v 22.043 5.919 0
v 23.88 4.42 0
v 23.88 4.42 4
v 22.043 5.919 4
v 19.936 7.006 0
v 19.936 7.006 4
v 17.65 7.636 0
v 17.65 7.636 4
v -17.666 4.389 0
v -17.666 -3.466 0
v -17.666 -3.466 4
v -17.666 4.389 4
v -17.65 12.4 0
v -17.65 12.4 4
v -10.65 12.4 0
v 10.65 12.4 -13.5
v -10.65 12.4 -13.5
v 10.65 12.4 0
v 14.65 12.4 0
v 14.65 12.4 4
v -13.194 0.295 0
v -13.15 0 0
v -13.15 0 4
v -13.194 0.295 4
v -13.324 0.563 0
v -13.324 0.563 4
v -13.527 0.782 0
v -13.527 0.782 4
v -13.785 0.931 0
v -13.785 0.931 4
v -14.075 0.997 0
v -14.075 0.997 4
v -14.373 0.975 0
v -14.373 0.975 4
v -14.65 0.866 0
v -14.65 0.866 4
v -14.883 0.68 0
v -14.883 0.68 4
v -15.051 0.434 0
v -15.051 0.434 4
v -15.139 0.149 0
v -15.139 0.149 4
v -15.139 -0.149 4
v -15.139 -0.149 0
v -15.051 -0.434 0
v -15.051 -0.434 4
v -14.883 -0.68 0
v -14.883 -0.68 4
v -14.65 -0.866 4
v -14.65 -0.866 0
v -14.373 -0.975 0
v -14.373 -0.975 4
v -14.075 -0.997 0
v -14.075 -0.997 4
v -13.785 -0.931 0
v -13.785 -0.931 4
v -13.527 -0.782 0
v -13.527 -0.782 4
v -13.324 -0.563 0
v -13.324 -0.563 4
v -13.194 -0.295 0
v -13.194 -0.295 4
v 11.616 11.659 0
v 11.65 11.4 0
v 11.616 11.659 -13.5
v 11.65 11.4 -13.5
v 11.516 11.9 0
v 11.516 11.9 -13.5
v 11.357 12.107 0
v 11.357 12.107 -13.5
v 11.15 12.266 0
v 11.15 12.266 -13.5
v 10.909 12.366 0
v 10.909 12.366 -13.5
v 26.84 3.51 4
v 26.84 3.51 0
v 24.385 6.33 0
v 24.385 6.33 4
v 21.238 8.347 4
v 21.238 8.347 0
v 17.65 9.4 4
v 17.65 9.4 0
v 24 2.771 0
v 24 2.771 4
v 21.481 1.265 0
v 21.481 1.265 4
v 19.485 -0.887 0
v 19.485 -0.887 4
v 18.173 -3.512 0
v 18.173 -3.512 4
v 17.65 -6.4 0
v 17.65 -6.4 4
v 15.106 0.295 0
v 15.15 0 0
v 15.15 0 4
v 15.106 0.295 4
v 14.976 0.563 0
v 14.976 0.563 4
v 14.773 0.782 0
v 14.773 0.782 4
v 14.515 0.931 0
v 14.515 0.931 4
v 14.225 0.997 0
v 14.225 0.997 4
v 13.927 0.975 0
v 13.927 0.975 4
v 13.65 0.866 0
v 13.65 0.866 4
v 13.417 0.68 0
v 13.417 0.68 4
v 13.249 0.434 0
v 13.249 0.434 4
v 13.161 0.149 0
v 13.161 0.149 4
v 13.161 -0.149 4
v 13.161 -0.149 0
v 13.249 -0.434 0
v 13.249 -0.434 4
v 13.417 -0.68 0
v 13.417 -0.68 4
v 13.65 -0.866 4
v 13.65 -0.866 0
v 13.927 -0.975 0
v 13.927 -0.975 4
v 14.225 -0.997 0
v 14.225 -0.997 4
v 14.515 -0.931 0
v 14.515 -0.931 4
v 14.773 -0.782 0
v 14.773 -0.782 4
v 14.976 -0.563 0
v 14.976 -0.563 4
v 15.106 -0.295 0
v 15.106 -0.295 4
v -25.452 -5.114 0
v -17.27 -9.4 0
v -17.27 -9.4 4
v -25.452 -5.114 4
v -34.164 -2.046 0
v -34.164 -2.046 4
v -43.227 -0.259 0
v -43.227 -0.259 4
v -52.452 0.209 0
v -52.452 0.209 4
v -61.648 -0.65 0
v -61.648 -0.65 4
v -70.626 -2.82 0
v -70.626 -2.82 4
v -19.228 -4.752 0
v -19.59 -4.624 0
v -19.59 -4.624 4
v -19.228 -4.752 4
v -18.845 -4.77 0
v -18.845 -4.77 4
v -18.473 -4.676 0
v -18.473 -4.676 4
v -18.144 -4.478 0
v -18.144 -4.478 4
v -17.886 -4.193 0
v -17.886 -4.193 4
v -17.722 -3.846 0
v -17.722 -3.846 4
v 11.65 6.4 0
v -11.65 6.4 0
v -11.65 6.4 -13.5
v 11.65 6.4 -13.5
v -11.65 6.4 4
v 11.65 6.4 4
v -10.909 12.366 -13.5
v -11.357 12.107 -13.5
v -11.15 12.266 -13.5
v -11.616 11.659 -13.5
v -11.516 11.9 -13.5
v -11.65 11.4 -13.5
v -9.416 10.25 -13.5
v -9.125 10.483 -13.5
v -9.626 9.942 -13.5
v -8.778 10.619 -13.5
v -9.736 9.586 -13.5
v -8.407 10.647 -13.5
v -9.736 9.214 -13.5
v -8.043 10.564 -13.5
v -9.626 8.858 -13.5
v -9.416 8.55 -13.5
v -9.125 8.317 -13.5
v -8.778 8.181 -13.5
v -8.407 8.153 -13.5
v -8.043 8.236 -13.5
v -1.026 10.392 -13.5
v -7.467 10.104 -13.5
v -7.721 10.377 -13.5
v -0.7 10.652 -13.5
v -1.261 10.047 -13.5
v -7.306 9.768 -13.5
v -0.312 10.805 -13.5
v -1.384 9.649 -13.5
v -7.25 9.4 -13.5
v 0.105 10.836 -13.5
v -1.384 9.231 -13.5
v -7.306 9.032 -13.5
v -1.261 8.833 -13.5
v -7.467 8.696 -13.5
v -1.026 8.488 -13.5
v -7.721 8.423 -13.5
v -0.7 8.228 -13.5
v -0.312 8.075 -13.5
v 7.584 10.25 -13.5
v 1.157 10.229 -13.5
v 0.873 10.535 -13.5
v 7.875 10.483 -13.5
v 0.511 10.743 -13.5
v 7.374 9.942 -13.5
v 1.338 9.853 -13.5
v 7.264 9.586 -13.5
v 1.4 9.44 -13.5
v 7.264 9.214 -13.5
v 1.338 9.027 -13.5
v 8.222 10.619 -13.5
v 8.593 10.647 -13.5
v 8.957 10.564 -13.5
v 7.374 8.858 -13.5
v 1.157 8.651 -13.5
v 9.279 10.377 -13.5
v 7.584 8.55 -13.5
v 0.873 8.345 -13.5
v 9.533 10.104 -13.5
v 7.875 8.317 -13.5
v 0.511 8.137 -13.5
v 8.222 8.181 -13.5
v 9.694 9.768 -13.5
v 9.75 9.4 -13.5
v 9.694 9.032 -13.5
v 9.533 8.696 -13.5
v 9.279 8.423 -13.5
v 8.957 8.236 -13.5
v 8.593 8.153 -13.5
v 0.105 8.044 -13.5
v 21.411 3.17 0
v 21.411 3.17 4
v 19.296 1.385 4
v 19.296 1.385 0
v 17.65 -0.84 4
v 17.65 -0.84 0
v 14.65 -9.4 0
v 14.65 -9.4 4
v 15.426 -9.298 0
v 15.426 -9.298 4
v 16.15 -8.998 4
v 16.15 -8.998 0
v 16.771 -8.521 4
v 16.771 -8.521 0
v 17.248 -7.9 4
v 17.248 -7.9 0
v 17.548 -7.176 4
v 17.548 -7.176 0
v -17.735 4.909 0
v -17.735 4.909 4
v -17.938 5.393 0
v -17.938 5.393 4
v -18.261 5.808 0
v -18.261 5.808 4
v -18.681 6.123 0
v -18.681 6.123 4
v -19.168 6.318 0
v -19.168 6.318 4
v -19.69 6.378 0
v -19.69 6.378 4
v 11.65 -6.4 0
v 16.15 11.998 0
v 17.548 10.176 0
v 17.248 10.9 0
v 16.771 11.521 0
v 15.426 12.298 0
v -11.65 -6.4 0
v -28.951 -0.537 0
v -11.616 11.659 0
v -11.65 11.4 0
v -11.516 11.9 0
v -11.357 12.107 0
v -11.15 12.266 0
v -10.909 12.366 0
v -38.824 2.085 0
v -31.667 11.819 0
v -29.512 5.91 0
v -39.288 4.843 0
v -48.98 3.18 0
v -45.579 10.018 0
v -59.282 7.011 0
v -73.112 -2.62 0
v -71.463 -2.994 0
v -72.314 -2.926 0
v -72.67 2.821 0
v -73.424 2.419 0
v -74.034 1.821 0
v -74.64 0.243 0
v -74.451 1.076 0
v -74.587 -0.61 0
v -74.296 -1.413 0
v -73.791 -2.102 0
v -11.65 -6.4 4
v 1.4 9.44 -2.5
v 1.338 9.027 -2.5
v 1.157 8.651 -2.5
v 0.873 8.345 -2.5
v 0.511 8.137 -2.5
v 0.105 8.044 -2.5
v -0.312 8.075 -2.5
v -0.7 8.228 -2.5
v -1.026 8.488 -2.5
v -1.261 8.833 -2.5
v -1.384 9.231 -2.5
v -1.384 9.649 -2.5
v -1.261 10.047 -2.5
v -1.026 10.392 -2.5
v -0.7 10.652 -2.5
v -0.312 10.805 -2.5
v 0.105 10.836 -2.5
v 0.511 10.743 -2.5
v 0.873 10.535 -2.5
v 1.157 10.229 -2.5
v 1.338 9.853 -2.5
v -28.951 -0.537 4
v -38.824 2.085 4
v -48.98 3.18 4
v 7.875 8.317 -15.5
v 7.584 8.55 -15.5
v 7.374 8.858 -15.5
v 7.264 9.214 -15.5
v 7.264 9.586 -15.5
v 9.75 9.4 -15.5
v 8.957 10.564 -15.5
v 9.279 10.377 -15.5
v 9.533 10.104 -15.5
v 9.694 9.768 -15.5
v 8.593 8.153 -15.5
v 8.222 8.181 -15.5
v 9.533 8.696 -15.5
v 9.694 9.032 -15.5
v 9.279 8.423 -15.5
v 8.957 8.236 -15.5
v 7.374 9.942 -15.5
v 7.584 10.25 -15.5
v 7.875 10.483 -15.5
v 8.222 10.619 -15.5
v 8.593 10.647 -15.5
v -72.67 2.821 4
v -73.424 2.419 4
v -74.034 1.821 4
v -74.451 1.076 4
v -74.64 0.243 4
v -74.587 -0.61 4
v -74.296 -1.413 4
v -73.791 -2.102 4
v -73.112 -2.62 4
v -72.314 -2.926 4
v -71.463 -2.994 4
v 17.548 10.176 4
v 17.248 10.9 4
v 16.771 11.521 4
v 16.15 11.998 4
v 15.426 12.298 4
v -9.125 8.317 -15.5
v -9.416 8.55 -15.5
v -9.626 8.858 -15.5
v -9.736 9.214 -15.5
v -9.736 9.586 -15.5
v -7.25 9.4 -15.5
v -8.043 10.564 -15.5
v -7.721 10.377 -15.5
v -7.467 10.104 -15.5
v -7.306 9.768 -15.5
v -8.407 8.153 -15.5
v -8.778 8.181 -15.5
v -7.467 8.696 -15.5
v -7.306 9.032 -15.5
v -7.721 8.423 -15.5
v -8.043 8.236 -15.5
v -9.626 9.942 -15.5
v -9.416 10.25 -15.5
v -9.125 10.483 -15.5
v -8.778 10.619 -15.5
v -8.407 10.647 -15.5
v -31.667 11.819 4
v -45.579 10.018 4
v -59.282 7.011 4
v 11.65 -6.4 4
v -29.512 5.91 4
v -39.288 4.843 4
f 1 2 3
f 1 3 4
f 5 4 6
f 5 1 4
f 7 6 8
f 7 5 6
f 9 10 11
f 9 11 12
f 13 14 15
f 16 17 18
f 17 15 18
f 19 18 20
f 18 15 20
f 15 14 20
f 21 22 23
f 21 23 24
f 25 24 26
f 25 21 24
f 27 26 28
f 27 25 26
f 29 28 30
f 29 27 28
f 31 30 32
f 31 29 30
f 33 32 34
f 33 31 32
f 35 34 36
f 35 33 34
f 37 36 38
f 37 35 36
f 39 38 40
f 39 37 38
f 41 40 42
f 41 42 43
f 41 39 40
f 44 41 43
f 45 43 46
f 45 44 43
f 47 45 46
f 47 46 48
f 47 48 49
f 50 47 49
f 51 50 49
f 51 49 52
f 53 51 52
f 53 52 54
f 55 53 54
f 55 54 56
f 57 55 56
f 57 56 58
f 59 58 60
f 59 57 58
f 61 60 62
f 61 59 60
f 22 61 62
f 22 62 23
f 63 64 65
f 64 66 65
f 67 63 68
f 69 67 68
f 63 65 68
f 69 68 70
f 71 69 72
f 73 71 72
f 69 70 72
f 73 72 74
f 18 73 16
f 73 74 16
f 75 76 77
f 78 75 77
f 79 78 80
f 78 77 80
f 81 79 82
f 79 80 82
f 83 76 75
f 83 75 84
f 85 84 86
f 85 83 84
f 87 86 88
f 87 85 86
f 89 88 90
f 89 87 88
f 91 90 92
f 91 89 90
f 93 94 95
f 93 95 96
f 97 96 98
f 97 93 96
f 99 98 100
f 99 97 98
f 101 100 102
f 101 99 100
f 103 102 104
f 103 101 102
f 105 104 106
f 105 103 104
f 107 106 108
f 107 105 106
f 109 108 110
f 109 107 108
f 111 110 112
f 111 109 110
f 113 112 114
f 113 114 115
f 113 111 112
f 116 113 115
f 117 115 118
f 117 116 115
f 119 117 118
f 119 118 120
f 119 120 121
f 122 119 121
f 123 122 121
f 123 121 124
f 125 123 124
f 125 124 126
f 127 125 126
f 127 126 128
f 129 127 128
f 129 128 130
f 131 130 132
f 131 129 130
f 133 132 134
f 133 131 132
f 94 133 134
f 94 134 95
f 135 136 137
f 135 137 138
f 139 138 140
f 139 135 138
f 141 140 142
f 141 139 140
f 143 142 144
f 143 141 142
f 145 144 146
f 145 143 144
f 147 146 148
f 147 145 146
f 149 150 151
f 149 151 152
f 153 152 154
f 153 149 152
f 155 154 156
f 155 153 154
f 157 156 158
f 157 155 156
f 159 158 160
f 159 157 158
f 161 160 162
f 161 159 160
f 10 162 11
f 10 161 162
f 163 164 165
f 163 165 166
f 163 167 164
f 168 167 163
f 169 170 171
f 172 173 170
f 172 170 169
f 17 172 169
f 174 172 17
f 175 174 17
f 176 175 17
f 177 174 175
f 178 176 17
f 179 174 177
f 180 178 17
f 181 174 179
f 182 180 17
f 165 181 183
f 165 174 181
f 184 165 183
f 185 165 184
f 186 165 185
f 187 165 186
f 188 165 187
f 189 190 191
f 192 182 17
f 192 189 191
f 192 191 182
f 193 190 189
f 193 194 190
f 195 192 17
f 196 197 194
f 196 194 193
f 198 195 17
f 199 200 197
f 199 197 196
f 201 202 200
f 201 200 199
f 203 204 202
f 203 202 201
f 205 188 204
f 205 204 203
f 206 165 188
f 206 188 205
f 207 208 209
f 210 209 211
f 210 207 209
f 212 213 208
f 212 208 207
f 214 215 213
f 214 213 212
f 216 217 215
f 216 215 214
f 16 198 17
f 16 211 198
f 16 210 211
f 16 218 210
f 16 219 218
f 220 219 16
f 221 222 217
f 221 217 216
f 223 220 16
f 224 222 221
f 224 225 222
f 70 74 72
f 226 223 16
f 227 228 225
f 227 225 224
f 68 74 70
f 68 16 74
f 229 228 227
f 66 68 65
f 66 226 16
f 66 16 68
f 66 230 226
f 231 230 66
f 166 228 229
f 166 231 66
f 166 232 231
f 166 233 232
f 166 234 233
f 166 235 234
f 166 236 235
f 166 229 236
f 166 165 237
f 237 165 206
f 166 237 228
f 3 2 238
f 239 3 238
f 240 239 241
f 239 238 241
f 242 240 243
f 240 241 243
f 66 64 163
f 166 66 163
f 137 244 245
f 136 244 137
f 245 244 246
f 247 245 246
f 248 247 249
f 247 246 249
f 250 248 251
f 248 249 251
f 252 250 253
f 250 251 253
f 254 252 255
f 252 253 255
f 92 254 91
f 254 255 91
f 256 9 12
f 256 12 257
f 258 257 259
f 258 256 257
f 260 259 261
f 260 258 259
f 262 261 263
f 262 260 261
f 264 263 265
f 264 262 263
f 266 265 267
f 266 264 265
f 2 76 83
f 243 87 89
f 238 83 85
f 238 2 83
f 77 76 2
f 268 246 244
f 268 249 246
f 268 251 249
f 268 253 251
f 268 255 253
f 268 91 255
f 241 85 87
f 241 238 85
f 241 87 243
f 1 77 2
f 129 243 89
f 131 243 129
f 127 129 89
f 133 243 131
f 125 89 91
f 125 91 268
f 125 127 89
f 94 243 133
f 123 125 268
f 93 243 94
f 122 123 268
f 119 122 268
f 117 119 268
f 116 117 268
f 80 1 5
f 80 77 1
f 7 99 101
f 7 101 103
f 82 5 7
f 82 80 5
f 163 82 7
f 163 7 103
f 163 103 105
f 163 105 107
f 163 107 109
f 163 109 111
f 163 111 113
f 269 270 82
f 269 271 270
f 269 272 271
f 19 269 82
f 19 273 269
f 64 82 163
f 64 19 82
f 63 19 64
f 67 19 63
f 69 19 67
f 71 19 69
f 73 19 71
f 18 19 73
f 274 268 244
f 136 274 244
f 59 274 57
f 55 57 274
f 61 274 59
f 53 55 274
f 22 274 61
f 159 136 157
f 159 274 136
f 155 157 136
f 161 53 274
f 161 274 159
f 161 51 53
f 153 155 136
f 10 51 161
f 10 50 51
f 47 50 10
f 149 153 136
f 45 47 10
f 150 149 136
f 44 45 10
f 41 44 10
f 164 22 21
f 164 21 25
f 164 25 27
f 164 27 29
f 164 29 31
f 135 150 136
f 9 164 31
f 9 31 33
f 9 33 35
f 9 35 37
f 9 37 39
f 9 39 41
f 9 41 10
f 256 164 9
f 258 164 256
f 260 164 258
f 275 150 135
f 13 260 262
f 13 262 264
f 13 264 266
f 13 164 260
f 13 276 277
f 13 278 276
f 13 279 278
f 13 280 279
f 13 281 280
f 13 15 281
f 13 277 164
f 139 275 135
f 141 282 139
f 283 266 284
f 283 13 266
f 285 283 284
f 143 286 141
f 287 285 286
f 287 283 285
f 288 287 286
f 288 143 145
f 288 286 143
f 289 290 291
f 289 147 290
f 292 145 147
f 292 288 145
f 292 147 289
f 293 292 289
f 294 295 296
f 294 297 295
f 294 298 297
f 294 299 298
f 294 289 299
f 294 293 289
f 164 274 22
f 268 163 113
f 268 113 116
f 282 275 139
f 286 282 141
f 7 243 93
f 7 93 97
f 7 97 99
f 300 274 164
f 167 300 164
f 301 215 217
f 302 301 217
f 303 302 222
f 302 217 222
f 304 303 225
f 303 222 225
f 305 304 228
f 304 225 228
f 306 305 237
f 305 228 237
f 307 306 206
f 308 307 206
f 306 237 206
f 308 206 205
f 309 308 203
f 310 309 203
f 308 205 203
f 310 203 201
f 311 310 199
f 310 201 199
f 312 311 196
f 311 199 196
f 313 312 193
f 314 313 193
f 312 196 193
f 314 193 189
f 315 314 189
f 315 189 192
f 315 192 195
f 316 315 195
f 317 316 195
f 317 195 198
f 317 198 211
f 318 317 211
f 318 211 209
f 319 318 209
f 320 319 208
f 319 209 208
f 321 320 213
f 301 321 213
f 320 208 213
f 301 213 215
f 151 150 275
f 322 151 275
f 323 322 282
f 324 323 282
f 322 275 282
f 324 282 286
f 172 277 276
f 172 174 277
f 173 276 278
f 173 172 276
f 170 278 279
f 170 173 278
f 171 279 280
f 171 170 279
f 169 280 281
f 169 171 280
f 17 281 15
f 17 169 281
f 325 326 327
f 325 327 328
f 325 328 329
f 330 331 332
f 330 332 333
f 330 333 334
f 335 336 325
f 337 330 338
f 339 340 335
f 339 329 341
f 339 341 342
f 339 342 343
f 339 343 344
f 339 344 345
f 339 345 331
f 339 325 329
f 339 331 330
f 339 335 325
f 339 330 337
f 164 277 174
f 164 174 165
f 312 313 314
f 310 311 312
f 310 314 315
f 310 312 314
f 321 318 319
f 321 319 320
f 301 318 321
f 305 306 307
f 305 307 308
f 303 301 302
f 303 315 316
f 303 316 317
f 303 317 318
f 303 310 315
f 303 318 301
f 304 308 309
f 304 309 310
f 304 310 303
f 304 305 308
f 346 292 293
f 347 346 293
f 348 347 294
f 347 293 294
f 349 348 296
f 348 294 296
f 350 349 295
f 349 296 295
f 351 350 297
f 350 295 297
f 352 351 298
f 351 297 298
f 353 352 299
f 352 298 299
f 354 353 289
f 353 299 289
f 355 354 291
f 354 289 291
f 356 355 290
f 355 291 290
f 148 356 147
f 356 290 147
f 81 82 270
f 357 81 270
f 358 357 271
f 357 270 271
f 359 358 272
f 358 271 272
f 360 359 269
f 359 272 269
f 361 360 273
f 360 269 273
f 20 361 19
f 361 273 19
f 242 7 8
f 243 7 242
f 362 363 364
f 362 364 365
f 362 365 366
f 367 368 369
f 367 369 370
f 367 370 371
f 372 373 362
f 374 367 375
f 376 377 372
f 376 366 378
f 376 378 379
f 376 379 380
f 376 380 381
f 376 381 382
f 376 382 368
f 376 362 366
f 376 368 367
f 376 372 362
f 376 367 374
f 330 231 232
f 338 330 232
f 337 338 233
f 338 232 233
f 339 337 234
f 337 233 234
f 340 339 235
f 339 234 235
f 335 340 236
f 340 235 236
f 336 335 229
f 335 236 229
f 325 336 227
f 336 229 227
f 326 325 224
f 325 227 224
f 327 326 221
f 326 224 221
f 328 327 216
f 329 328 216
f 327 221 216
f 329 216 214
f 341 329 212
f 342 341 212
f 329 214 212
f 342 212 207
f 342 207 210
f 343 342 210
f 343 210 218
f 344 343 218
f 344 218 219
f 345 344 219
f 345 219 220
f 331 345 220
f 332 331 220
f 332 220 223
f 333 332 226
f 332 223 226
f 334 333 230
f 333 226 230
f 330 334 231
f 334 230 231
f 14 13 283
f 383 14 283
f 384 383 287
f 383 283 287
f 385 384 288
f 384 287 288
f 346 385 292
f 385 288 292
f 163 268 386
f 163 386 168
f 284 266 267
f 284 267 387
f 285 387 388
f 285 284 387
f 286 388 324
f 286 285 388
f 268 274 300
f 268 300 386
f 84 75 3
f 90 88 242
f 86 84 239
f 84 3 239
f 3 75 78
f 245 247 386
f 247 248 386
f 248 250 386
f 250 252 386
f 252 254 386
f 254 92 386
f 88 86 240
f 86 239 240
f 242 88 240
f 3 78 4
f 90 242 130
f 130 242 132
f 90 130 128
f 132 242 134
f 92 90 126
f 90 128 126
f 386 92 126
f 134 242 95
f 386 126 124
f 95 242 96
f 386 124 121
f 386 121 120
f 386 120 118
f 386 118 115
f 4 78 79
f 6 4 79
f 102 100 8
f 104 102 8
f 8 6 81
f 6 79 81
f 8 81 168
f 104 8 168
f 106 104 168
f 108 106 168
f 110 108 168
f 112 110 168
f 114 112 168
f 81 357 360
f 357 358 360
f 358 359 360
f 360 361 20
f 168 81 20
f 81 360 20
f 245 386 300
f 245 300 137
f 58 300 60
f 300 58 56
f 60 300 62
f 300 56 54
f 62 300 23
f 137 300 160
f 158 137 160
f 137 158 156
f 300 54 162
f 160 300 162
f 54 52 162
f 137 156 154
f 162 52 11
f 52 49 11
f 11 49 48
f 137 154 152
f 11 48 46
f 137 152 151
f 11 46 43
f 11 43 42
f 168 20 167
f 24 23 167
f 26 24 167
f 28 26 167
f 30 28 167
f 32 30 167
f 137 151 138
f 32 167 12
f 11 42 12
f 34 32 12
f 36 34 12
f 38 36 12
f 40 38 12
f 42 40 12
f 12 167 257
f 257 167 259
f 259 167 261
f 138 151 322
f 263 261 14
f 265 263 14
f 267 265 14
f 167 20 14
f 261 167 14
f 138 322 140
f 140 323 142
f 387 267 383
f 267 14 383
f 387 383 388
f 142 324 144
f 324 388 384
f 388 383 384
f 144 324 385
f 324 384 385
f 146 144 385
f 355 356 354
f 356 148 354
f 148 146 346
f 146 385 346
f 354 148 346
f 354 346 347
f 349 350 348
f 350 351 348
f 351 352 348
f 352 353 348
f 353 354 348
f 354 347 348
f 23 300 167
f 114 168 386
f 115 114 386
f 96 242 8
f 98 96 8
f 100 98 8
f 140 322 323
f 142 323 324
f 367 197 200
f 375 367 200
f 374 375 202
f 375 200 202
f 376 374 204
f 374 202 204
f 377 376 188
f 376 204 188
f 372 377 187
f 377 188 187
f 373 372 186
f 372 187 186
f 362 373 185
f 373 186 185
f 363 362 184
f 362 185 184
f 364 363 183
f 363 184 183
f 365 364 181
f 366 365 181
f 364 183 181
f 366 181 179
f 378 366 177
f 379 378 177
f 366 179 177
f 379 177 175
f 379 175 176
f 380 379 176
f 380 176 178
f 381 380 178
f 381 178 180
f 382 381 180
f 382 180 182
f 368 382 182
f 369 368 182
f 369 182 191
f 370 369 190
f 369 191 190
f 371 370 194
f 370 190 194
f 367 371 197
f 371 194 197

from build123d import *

# Parameters (mm, degrees)
SKETCH_R     = 1
SKETCH_W     = 23.3
SKETCH_H     = 12.8
PAD_DEPTH    = 4
SKETCH001_W  = 23.3
SKETCH001_H  = 6
PAD001_DEPTH = 13.5
SKETCH002_R  = 1.25
PAD002_DEPTH = 2
SKETCH003_R  = 1.4
POCKET_DEPTH = 11
FILLET_R     = 1
FILLET001_R  = 1


with BuildPart() as part:
    # Sketch → Pad (new body)
    with BuildSketch(Plane.XY):
        with BuildLine():
            Line((-17.65, 12.4), (14.65, 12.4))
            ThreePointArc((17.65, 9.4), (16.77132, 11.52132), (14.65, 12.4))
            ThreePointArc((26.84, 3.51), (22.883245, 7.450836), (17.65, 9.4))
            ThreePointArc((26.84, 3.51), (20.406481, 0.259943), (17.65, -6.4))
            ThreePointArc((14.65, -9.4), (16.77132, -8.52132), (17.65, -6.4))
            Line((14.65, -9.4), (-17.27, -9.4))
            ThreePointArc((-17.27, -9.4), (-43.226691, -0.259051), (-70.626477, -2.82))
            ThreePointArc((-72.67, 2.821276), (-74.470639, -1.021762), (-70.626477, -2.82))
            ThreePointArc((-17.65, 12.4), (-45.579054, 10.017677), (-72.67, 2.821276))
        make_face()
        with Locations((-14.15, 0)):
            Circle(SKETCH_R, mode=Mode.SUBTRACT)
        with Locations((14.15, 0)):
            Circle(SKETCH_R, mode=Mode.SUBTRACT)
        Rectangle(SKETCH_W, SKETCH_H, mode=Mode.SUBTRACT)
        with BuildLine():
            Line((17.65, 7.636176), (17.65, -0.84))
            ThreePointArc((23.88, 4.42), (20.301686, 2.338754), (17.65, -0.84))
            ThreePointArc((23.88, 4.42), (21.017458, 6.51712), (17.65, 7.636176))
        make_face(mode=Mode.SUBTRACT)
        with BuildLine():
            Line((-17.66615, -3.466269), (-17.66615, 4.388555))
            ThreePointArc((-17.66615, 4.388555), (-18.261027, 5.807615), (-19.69, 6.378267))
            ThreePointArc((-19.69, 6.378267), (-34.408413, 5.451456), (-48.98, 3.18))
            ThreePointArc((-19.59, -4.623545), (-33.83794, 0.961961), (-48.98, 3.18))
            ThreePointArc((-19.59, -4.623545), (-18.300889, -4.58882), (-17.66615, -3.466269))
        make_face(mode=Mode.SUBTRACT)
    extrude(amount=PAD_DEPTH)

    # Sketch001 (on Face24 of Pad) → Pad001 (join)
    with BuildSketch(Plane(origin=(0, 0, 0), x_dir=(1, 0, 0), z_dir=(0, 0, -1))):
        with Locations((0, -9.4)):
            Rectangle(SKETCH001_W, SKETCH001_H)
    extrude(amount=PAD001_DEPTH)

    # Sketch002 (on Face29 of Pad001) → Pad002 (join)
    with BuildSketch(Plane(origin=(0, 0, -13.5), x_dir=(1, 0, 0), z_dir=(0, 0, -1))):
        with Locations((-8.5, -9.4)):
            Circle(SKETCH002_R)
        with Locations((8.5, -9.4)):
            Circle(SKETCH002_R)
    extrude(amount=PAD002_DEPTH)

    # Sketch003 (on Face29 of Pad002) → Pocket (cut)
    with BuildSketch(Plane(origin=(0, 0, -13.5), x_dir=(1, 0, 0), z_dir=(0, 0, -1))):
        with Locations((0, -9.44)):
            Circle(SKETCH003_R)
    extrude(amount=-POCKET_DEPTH, mode=Mode.SUBTRACT)

    # Fillet
    fillet_edges = [part.edges().sort_by_distance(p)[0] for p in [
        (-11.65, 12.4, -6.75),
    ]]
    fillet(fillet_edges, radius=FILLET_R)

    # Fillet001
    fillet001_edges = [part.edges().sort_by_distance(p)[0] for p in [
        (11.65, 12.4, -6.75),
    ]]
    fillet(fillet001_edges, radius=FILLET001_R)


solid = part.part
